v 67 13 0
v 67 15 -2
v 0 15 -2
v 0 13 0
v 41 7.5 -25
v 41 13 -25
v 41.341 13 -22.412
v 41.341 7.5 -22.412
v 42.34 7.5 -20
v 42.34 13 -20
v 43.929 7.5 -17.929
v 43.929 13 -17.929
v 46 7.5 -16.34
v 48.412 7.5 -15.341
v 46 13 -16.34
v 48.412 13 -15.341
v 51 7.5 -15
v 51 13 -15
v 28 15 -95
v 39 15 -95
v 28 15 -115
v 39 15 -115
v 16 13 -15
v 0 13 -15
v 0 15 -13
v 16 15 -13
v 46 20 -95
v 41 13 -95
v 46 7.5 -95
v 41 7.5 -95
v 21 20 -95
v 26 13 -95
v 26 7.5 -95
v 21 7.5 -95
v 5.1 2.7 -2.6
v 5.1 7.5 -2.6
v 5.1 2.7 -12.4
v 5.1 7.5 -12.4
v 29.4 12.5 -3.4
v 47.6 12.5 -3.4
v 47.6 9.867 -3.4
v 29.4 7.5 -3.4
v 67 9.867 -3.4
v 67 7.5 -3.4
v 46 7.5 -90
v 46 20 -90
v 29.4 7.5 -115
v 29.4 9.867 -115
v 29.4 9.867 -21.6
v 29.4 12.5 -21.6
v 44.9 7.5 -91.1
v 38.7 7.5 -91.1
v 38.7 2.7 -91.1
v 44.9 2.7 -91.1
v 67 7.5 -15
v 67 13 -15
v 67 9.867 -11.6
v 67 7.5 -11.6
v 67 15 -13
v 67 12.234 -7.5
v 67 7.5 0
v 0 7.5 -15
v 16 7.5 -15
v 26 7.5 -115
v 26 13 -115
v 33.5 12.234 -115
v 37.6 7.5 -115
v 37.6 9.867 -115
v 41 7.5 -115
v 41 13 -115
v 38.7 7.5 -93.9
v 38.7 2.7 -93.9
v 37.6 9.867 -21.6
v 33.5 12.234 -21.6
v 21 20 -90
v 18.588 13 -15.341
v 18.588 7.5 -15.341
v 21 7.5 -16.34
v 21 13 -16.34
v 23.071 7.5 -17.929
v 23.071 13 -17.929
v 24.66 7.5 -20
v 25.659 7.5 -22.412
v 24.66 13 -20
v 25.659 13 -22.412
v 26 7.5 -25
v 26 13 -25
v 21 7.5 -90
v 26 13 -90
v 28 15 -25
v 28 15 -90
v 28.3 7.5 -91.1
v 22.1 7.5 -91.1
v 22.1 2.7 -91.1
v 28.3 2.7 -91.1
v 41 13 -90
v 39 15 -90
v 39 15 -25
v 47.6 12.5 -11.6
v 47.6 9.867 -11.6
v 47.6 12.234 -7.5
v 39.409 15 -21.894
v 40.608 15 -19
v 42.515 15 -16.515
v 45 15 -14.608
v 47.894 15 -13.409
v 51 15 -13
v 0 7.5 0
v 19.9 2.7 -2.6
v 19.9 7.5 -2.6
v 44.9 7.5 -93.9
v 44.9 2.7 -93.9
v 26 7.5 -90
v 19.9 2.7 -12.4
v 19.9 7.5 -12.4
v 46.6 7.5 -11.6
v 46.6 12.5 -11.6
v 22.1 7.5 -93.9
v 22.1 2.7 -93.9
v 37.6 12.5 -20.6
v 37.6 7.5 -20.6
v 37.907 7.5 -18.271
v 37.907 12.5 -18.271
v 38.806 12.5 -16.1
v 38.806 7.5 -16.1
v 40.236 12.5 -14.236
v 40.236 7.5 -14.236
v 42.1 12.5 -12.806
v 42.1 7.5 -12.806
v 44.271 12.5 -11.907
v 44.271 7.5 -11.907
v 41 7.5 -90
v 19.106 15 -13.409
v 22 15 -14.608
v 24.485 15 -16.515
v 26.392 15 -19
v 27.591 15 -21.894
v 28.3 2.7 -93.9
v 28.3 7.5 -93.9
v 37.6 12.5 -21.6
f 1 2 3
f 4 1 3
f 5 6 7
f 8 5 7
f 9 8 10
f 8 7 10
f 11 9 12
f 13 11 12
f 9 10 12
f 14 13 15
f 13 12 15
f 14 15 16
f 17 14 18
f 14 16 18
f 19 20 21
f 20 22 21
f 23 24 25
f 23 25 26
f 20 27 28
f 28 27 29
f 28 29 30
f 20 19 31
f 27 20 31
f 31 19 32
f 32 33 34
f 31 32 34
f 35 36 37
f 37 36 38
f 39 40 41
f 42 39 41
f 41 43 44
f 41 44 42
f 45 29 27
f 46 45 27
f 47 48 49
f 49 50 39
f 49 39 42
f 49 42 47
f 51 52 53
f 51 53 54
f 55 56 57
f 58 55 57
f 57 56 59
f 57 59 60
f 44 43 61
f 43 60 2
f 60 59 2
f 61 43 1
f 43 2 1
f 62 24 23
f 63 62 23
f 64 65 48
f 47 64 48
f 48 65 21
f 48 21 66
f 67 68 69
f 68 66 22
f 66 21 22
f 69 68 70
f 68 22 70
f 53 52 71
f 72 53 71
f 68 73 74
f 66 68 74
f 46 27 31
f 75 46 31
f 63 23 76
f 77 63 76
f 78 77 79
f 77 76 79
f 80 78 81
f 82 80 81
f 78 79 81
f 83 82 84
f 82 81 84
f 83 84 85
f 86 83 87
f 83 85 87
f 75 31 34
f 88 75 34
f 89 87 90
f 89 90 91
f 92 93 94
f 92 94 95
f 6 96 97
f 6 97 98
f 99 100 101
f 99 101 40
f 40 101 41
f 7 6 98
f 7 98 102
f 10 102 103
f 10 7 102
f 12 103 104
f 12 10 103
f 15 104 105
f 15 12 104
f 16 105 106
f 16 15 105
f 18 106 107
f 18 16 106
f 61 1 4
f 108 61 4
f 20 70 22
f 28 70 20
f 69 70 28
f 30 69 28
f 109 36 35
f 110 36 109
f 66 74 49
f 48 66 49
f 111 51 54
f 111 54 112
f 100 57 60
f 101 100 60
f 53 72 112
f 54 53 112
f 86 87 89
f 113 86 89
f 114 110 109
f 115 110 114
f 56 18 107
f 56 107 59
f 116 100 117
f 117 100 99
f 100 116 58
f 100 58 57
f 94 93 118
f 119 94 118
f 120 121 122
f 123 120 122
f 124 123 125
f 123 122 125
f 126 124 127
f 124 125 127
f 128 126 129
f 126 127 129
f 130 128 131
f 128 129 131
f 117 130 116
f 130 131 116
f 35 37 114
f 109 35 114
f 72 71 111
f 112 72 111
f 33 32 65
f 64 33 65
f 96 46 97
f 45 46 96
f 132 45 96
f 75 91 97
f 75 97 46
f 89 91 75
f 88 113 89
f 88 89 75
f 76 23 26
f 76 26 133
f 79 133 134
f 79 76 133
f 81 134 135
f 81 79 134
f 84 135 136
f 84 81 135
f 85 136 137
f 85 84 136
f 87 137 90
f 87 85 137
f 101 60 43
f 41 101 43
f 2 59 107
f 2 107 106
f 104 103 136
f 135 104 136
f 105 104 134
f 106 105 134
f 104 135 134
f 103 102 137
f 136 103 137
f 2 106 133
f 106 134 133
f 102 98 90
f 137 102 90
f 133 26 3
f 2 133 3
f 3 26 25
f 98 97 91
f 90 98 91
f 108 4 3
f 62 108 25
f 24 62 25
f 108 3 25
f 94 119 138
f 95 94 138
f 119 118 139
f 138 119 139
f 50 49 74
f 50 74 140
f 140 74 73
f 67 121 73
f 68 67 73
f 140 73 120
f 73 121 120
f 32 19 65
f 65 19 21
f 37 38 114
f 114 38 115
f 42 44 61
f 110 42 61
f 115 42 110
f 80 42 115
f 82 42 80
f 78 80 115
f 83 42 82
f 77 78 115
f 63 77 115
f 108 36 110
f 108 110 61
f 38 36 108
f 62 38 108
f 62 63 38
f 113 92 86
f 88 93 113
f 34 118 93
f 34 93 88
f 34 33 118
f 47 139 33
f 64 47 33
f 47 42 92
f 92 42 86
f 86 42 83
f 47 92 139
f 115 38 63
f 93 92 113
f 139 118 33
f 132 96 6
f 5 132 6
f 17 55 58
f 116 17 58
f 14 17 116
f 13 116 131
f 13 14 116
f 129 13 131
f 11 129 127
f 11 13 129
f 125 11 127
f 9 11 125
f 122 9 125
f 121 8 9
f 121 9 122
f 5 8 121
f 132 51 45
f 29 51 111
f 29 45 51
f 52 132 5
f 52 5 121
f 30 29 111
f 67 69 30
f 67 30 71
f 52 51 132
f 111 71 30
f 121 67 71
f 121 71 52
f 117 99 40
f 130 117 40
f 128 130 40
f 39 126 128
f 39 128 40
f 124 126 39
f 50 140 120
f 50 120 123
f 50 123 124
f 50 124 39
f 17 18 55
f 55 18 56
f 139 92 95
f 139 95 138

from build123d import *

# Parameters (mm, degrees)
BOSS_EXTRUDE1_DEPTH = 7.5
CUT_EXTRUDE6_DEPTH  = 5
BOSS_EXTRUDE2_START = -20
BOSS_EXTRUDE2_DEPTH = 5
CHAMFER1_SIZE       = 2
SKETCH11_W          = 14.8
SKETCH11_H          = 9.8
SKETCH11_W_2        = 6.2
SKETCH11_H_2        = 2.8
BOSS_EXTRUDE3_DEPTH = 4.8


with BuildPart() as part:
    # Sketch1 → Boss-Extrude1 (new body)
    with BuildSketch(Plane(origin=(0, 0, 0), x_dir=(1, 0, 0), z_dir=(0, 1, 0))):
        with BuildLine():
            Line((0, 0), (0, 15))
            Line((0, 15), (16, 15))
            ThreePointArc((16, 15), (23.071067812, 17.928932188), (26, 25))
            Line((26, 25), (26, 115))
            Line((26, 115), (41, 115))
            Line((41, 115), (41, 25))
            ThreePointArc((41, 25), (43.928932188, 17.928932188), (51, 15))
            Line((51, 15), (67, 15))
            Line((67, 15), (67, 0))
            Line((67, 0), (0, 0))
        make_face()
    extrude(amount=BOSS_EXTRUDE1_DEPTH)

    # Cut-Sweep1: sweep along a path in Sketch2
    with BuildLine(Plane(origin=(0, 7.5, 0), x_dir=(1, 0, 0), z_dir=(0, 1, 0))) as cut_sweep1_path:
        Line((33.5, 115), (33.5, 7.5))
        Line((33.5, 7.5), (67, 7.5))
    # Sketch3 → Cut-Sweep1 (sweep, cut)
    with BuildSketch(Plane(origin=(0, 0, -115), x_dir=(-1, 0, 0), z_dir=(0, 0, -1))):
        Polygon((-37.6, 5.132863896), (-33.5, 2.765727793), (-29.4, 5.132863896), (-29.4, 9.867136104), (-33.5, 12.234272207), (-37.6, 9.867136104), align=None)
    sweep(path=cut_sweep1_path.line, transition=Transition.RIGHT, mode=Mode.SUBTRACT)

    # Sketch7 → Cut-Extrude6 (cut)
    with BuildSketch(Plane(origin=(0, 7.5, 0), x_dir=(1, 0, 0), z_dir=(0, 1, 0))):
        with BuildLine():
            Line((47.6, 11.6), (47.6, 3.4))
            Line((47.6, 3.4), (29.4, 3.4))
            Line((29.4, 3.4), (29.4, 21.6))
            Line((29.4, 21.6), (37.6, 21.6))
            Line((37.6, 21.6), (37.6, 20.6))
            ThreePointArc((37.6, 20.6), (40.236038969, 14.236038969), (46.6, 11.6))
            Line((46.6, 11.6), (47.6, 11.6))
        make_face()
    extrude(amount=-CUT_EXTRUDE6_DEPTH, mode=Mode.SUBTRACT)

    # Sketch10 → Boss-Extrude2 (add)
    with BuildSketch(Plane(origin=(0, 0, -115), x_dir=(-1, 0, 0), z_dir=(0, 0, -1)).offset(BOSS_EXTRUDE2_START)):
        Polygon((-41, 7.5), (-46, 7.5), (-46, -5), (-21, -5), (-21, 7.5), (-26, 7.5), (-26, 0), (-41, 0), align=None)
    extrude(amount=-BOSS_EXTRUDE2_DEPTH)

    # Chamfer1
    chamfer1_edges = [part.edges().sort_by_distance(p)[0] for p in [
        (26, 0, -57.5),
        (41, 0, -105),
        (33.5, 0, 0),
        (8, 0, -15),
        (23.071067812, 0, -17.928932188),
        (26, 0, -105),
        (41, 0, -57.5),
        (43.928932188, 0, -17.928932188),
        (59, 0, -15),
    ]]
    chamfer(chamfer1_edges, length=CHAMFER1_SIZE)

    # Sketch11 → Boss-Extrude3 (add)
    with BuildSketch(Plane(origin=(0, 7.5, 0), x_dir=(1, 0, 0), z_dir=(0, 1, 0))):
        with Locations((12.5, 7.5)):
            Rectangle(SKETCH11_W, SKETCH11_H)
        with Locations((25.2, 92.5)):
            Rectangle(SKETCH11_W_2, SKETCH11_H_2)
        with Locations((41.8, 92.5)):
            Rectangle(SKETCH11_W_2, SKETCH11_H_2)
    extrude(amount=BOSS_EXTRUDE3_DEPTH)


with BuildPart() as body_2:
    # Mirror1: mirrored copy
    add(part.part.mirror(Plane.ZX.offset(7.5)))


solid = body_2.part
